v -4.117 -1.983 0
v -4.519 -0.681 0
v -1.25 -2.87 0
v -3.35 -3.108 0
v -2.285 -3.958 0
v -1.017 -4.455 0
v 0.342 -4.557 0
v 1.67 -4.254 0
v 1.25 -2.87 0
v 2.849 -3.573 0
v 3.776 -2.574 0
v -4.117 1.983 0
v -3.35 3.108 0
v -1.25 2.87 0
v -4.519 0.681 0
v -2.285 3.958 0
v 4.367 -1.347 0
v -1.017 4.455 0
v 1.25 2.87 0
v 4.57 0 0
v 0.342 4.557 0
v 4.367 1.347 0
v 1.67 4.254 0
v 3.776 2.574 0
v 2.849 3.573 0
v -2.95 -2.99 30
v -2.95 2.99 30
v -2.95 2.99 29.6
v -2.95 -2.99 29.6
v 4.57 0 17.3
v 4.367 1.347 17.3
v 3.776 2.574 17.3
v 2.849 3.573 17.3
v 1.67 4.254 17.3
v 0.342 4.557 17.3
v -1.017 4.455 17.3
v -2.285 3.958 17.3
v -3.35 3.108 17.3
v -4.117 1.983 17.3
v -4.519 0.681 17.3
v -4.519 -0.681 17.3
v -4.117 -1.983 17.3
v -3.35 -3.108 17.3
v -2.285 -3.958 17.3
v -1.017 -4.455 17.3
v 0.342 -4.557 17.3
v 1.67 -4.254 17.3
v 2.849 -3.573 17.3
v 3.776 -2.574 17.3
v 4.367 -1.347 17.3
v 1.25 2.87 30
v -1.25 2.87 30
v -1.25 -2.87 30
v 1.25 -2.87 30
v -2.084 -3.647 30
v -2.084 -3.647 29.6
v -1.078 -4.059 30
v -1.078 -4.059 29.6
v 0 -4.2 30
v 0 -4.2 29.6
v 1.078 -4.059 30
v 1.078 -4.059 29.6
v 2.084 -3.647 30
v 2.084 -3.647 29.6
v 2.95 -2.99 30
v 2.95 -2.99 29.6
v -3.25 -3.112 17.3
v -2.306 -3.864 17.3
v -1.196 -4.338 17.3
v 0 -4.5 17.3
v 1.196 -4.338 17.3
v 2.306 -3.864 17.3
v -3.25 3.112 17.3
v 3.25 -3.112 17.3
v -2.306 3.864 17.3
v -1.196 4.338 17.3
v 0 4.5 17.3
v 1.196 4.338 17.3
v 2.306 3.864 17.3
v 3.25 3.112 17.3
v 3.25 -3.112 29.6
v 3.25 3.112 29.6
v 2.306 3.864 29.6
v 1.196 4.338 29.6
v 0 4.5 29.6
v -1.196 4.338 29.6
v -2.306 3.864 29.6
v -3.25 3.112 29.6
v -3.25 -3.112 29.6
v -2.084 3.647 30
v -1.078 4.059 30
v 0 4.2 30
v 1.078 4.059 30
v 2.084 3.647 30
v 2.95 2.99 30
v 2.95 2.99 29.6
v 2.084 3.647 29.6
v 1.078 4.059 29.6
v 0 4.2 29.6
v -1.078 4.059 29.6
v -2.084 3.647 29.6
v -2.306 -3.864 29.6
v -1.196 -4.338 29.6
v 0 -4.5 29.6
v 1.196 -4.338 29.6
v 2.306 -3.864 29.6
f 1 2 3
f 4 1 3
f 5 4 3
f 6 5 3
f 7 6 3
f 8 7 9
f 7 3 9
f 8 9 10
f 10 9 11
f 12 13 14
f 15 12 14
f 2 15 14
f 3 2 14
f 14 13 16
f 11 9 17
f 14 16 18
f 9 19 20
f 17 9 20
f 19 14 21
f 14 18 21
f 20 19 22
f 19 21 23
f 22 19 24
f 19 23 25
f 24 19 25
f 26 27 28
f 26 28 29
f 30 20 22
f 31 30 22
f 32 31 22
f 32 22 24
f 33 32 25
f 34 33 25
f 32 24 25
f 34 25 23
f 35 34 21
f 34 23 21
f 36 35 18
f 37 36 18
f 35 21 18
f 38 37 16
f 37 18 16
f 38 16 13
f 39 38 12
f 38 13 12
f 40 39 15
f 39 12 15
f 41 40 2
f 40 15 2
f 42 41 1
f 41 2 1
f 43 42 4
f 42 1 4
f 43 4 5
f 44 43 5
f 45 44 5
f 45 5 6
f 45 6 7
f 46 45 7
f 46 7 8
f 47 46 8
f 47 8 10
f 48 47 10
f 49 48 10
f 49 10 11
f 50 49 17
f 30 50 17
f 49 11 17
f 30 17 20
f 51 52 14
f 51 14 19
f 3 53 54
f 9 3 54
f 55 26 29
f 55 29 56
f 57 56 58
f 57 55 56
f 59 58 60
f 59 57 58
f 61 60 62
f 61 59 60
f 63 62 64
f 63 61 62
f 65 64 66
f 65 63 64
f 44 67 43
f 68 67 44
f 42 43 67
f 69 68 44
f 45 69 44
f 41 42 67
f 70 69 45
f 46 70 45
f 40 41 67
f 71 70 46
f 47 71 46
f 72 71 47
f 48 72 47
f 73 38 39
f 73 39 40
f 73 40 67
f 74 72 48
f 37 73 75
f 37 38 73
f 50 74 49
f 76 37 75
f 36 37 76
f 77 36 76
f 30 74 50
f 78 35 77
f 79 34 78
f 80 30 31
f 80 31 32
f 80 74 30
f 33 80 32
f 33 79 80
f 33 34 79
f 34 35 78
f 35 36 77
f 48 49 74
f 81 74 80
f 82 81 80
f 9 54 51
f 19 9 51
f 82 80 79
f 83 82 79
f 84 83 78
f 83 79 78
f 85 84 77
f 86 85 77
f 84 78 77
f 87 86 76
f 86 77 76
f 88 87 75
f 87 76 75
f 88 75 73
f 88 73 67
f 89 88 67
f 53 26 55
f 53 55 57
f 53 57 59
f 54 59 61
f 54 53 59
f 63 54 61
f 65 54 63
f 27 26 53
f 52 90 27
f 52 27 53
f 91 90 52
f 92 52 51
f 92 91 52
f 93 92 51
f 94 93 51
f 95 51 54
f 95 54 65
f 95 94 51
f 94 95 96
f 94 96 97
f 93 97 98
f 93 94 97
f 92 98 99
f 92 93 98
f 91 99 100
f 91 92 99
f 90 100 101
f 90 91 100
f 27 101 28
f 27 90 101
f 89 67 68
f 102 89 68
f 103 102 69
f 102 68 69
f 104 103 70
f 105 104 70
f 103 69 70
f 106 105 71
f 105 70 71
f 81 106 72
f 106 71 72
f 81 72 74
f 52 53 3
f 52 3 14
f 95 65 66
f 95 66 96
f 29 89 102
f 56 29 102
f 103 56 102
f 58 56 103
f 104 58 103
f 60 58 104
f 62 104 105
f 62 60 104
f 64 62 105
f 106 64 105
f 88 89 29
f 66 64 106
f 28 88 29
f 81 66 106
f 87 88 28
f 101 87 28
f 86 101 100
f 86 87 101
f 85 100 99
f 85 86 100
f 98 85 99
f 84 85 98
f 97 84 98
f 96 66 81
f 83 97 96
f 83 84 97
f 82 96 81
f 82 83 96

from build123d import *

# Parameters (mm, degrees)
SKETCH2_R           = 4.57
BOSS_EXTRUDE1_DEPTH = 17.3
BOSS_EXTRUDE3_DEPTH = 12.7
SKETCH5_W           = 2.5
SKETCH5_H           = 5.74
CUT_EXTRUDE1_DEPTH  = 31
SKETCH6_R           = 4.5
CUT_EXTRUDE3_DEPTH  = 0.4


with BuildPart() as part:
    # Sketch2 → Boss-Extrude1 (new body)
    with BuildSketch(Plane.XY):
        Circle(SKETCH2_R)
    extrude(amount=BOSS_EXTRUDE1_DEPTH)

    # Sketch4 → Boss-Extrude3 (add)
    with BuildSketch(Plane.XY.offset(17.3)):
        with BuildLine():
            Line((-3.25, 3.112474899), (-3.25, -3.112474899))
            ThreePointArc((-3.25, -3.112474899), (0, -4.5), (3.25, -3.112474899))
            Line((3.25, -3.112474899), (3.25, 3.112474899))
            ThreePointArc((3.25, 3.112474899), (0, 4.5), (-3.25, 3.112474899))
        make_face()
    extrude(amount=BOSS_EXTRUDE3_DEPTH)

    # Sketch5 → Cut-Extrude1 (cut, through all)
    with BuildSketch(Plane.XY.offset(30)):
        Rectangle(SKETCH5_W, SKETCH5_H)
    extrude(amount=-CUT_EXTRUDE1_DEPTH, mode=Mode.SUBTRACT)

    # Sketch6 → Cut-Extrude3 (cut)
    with BuildSketch(Plane.XY.offset(30)):
        Circle(SKETCH6_R)
        with BuildLine():
            Line((-2.95, 2.989565186), (-2.95, -2.989565186))
            ThreePointArc((-2.95, -2.989565186), (0, -4.2), (2.95, -2.989565186))
            Line((2.95, -2.989565186), (2.95, 2.989565186))
            ThreePointArc((2.95, 2.989565186), (0, 4.2), (-2.95, 2.989565186))
        make_face(mode=Mode.SUBTRACT)
    extrude(amount=-CUT_EXTRUDE3_DEPTH, mode=Mode.SUBTRACT)


solid = part.part
